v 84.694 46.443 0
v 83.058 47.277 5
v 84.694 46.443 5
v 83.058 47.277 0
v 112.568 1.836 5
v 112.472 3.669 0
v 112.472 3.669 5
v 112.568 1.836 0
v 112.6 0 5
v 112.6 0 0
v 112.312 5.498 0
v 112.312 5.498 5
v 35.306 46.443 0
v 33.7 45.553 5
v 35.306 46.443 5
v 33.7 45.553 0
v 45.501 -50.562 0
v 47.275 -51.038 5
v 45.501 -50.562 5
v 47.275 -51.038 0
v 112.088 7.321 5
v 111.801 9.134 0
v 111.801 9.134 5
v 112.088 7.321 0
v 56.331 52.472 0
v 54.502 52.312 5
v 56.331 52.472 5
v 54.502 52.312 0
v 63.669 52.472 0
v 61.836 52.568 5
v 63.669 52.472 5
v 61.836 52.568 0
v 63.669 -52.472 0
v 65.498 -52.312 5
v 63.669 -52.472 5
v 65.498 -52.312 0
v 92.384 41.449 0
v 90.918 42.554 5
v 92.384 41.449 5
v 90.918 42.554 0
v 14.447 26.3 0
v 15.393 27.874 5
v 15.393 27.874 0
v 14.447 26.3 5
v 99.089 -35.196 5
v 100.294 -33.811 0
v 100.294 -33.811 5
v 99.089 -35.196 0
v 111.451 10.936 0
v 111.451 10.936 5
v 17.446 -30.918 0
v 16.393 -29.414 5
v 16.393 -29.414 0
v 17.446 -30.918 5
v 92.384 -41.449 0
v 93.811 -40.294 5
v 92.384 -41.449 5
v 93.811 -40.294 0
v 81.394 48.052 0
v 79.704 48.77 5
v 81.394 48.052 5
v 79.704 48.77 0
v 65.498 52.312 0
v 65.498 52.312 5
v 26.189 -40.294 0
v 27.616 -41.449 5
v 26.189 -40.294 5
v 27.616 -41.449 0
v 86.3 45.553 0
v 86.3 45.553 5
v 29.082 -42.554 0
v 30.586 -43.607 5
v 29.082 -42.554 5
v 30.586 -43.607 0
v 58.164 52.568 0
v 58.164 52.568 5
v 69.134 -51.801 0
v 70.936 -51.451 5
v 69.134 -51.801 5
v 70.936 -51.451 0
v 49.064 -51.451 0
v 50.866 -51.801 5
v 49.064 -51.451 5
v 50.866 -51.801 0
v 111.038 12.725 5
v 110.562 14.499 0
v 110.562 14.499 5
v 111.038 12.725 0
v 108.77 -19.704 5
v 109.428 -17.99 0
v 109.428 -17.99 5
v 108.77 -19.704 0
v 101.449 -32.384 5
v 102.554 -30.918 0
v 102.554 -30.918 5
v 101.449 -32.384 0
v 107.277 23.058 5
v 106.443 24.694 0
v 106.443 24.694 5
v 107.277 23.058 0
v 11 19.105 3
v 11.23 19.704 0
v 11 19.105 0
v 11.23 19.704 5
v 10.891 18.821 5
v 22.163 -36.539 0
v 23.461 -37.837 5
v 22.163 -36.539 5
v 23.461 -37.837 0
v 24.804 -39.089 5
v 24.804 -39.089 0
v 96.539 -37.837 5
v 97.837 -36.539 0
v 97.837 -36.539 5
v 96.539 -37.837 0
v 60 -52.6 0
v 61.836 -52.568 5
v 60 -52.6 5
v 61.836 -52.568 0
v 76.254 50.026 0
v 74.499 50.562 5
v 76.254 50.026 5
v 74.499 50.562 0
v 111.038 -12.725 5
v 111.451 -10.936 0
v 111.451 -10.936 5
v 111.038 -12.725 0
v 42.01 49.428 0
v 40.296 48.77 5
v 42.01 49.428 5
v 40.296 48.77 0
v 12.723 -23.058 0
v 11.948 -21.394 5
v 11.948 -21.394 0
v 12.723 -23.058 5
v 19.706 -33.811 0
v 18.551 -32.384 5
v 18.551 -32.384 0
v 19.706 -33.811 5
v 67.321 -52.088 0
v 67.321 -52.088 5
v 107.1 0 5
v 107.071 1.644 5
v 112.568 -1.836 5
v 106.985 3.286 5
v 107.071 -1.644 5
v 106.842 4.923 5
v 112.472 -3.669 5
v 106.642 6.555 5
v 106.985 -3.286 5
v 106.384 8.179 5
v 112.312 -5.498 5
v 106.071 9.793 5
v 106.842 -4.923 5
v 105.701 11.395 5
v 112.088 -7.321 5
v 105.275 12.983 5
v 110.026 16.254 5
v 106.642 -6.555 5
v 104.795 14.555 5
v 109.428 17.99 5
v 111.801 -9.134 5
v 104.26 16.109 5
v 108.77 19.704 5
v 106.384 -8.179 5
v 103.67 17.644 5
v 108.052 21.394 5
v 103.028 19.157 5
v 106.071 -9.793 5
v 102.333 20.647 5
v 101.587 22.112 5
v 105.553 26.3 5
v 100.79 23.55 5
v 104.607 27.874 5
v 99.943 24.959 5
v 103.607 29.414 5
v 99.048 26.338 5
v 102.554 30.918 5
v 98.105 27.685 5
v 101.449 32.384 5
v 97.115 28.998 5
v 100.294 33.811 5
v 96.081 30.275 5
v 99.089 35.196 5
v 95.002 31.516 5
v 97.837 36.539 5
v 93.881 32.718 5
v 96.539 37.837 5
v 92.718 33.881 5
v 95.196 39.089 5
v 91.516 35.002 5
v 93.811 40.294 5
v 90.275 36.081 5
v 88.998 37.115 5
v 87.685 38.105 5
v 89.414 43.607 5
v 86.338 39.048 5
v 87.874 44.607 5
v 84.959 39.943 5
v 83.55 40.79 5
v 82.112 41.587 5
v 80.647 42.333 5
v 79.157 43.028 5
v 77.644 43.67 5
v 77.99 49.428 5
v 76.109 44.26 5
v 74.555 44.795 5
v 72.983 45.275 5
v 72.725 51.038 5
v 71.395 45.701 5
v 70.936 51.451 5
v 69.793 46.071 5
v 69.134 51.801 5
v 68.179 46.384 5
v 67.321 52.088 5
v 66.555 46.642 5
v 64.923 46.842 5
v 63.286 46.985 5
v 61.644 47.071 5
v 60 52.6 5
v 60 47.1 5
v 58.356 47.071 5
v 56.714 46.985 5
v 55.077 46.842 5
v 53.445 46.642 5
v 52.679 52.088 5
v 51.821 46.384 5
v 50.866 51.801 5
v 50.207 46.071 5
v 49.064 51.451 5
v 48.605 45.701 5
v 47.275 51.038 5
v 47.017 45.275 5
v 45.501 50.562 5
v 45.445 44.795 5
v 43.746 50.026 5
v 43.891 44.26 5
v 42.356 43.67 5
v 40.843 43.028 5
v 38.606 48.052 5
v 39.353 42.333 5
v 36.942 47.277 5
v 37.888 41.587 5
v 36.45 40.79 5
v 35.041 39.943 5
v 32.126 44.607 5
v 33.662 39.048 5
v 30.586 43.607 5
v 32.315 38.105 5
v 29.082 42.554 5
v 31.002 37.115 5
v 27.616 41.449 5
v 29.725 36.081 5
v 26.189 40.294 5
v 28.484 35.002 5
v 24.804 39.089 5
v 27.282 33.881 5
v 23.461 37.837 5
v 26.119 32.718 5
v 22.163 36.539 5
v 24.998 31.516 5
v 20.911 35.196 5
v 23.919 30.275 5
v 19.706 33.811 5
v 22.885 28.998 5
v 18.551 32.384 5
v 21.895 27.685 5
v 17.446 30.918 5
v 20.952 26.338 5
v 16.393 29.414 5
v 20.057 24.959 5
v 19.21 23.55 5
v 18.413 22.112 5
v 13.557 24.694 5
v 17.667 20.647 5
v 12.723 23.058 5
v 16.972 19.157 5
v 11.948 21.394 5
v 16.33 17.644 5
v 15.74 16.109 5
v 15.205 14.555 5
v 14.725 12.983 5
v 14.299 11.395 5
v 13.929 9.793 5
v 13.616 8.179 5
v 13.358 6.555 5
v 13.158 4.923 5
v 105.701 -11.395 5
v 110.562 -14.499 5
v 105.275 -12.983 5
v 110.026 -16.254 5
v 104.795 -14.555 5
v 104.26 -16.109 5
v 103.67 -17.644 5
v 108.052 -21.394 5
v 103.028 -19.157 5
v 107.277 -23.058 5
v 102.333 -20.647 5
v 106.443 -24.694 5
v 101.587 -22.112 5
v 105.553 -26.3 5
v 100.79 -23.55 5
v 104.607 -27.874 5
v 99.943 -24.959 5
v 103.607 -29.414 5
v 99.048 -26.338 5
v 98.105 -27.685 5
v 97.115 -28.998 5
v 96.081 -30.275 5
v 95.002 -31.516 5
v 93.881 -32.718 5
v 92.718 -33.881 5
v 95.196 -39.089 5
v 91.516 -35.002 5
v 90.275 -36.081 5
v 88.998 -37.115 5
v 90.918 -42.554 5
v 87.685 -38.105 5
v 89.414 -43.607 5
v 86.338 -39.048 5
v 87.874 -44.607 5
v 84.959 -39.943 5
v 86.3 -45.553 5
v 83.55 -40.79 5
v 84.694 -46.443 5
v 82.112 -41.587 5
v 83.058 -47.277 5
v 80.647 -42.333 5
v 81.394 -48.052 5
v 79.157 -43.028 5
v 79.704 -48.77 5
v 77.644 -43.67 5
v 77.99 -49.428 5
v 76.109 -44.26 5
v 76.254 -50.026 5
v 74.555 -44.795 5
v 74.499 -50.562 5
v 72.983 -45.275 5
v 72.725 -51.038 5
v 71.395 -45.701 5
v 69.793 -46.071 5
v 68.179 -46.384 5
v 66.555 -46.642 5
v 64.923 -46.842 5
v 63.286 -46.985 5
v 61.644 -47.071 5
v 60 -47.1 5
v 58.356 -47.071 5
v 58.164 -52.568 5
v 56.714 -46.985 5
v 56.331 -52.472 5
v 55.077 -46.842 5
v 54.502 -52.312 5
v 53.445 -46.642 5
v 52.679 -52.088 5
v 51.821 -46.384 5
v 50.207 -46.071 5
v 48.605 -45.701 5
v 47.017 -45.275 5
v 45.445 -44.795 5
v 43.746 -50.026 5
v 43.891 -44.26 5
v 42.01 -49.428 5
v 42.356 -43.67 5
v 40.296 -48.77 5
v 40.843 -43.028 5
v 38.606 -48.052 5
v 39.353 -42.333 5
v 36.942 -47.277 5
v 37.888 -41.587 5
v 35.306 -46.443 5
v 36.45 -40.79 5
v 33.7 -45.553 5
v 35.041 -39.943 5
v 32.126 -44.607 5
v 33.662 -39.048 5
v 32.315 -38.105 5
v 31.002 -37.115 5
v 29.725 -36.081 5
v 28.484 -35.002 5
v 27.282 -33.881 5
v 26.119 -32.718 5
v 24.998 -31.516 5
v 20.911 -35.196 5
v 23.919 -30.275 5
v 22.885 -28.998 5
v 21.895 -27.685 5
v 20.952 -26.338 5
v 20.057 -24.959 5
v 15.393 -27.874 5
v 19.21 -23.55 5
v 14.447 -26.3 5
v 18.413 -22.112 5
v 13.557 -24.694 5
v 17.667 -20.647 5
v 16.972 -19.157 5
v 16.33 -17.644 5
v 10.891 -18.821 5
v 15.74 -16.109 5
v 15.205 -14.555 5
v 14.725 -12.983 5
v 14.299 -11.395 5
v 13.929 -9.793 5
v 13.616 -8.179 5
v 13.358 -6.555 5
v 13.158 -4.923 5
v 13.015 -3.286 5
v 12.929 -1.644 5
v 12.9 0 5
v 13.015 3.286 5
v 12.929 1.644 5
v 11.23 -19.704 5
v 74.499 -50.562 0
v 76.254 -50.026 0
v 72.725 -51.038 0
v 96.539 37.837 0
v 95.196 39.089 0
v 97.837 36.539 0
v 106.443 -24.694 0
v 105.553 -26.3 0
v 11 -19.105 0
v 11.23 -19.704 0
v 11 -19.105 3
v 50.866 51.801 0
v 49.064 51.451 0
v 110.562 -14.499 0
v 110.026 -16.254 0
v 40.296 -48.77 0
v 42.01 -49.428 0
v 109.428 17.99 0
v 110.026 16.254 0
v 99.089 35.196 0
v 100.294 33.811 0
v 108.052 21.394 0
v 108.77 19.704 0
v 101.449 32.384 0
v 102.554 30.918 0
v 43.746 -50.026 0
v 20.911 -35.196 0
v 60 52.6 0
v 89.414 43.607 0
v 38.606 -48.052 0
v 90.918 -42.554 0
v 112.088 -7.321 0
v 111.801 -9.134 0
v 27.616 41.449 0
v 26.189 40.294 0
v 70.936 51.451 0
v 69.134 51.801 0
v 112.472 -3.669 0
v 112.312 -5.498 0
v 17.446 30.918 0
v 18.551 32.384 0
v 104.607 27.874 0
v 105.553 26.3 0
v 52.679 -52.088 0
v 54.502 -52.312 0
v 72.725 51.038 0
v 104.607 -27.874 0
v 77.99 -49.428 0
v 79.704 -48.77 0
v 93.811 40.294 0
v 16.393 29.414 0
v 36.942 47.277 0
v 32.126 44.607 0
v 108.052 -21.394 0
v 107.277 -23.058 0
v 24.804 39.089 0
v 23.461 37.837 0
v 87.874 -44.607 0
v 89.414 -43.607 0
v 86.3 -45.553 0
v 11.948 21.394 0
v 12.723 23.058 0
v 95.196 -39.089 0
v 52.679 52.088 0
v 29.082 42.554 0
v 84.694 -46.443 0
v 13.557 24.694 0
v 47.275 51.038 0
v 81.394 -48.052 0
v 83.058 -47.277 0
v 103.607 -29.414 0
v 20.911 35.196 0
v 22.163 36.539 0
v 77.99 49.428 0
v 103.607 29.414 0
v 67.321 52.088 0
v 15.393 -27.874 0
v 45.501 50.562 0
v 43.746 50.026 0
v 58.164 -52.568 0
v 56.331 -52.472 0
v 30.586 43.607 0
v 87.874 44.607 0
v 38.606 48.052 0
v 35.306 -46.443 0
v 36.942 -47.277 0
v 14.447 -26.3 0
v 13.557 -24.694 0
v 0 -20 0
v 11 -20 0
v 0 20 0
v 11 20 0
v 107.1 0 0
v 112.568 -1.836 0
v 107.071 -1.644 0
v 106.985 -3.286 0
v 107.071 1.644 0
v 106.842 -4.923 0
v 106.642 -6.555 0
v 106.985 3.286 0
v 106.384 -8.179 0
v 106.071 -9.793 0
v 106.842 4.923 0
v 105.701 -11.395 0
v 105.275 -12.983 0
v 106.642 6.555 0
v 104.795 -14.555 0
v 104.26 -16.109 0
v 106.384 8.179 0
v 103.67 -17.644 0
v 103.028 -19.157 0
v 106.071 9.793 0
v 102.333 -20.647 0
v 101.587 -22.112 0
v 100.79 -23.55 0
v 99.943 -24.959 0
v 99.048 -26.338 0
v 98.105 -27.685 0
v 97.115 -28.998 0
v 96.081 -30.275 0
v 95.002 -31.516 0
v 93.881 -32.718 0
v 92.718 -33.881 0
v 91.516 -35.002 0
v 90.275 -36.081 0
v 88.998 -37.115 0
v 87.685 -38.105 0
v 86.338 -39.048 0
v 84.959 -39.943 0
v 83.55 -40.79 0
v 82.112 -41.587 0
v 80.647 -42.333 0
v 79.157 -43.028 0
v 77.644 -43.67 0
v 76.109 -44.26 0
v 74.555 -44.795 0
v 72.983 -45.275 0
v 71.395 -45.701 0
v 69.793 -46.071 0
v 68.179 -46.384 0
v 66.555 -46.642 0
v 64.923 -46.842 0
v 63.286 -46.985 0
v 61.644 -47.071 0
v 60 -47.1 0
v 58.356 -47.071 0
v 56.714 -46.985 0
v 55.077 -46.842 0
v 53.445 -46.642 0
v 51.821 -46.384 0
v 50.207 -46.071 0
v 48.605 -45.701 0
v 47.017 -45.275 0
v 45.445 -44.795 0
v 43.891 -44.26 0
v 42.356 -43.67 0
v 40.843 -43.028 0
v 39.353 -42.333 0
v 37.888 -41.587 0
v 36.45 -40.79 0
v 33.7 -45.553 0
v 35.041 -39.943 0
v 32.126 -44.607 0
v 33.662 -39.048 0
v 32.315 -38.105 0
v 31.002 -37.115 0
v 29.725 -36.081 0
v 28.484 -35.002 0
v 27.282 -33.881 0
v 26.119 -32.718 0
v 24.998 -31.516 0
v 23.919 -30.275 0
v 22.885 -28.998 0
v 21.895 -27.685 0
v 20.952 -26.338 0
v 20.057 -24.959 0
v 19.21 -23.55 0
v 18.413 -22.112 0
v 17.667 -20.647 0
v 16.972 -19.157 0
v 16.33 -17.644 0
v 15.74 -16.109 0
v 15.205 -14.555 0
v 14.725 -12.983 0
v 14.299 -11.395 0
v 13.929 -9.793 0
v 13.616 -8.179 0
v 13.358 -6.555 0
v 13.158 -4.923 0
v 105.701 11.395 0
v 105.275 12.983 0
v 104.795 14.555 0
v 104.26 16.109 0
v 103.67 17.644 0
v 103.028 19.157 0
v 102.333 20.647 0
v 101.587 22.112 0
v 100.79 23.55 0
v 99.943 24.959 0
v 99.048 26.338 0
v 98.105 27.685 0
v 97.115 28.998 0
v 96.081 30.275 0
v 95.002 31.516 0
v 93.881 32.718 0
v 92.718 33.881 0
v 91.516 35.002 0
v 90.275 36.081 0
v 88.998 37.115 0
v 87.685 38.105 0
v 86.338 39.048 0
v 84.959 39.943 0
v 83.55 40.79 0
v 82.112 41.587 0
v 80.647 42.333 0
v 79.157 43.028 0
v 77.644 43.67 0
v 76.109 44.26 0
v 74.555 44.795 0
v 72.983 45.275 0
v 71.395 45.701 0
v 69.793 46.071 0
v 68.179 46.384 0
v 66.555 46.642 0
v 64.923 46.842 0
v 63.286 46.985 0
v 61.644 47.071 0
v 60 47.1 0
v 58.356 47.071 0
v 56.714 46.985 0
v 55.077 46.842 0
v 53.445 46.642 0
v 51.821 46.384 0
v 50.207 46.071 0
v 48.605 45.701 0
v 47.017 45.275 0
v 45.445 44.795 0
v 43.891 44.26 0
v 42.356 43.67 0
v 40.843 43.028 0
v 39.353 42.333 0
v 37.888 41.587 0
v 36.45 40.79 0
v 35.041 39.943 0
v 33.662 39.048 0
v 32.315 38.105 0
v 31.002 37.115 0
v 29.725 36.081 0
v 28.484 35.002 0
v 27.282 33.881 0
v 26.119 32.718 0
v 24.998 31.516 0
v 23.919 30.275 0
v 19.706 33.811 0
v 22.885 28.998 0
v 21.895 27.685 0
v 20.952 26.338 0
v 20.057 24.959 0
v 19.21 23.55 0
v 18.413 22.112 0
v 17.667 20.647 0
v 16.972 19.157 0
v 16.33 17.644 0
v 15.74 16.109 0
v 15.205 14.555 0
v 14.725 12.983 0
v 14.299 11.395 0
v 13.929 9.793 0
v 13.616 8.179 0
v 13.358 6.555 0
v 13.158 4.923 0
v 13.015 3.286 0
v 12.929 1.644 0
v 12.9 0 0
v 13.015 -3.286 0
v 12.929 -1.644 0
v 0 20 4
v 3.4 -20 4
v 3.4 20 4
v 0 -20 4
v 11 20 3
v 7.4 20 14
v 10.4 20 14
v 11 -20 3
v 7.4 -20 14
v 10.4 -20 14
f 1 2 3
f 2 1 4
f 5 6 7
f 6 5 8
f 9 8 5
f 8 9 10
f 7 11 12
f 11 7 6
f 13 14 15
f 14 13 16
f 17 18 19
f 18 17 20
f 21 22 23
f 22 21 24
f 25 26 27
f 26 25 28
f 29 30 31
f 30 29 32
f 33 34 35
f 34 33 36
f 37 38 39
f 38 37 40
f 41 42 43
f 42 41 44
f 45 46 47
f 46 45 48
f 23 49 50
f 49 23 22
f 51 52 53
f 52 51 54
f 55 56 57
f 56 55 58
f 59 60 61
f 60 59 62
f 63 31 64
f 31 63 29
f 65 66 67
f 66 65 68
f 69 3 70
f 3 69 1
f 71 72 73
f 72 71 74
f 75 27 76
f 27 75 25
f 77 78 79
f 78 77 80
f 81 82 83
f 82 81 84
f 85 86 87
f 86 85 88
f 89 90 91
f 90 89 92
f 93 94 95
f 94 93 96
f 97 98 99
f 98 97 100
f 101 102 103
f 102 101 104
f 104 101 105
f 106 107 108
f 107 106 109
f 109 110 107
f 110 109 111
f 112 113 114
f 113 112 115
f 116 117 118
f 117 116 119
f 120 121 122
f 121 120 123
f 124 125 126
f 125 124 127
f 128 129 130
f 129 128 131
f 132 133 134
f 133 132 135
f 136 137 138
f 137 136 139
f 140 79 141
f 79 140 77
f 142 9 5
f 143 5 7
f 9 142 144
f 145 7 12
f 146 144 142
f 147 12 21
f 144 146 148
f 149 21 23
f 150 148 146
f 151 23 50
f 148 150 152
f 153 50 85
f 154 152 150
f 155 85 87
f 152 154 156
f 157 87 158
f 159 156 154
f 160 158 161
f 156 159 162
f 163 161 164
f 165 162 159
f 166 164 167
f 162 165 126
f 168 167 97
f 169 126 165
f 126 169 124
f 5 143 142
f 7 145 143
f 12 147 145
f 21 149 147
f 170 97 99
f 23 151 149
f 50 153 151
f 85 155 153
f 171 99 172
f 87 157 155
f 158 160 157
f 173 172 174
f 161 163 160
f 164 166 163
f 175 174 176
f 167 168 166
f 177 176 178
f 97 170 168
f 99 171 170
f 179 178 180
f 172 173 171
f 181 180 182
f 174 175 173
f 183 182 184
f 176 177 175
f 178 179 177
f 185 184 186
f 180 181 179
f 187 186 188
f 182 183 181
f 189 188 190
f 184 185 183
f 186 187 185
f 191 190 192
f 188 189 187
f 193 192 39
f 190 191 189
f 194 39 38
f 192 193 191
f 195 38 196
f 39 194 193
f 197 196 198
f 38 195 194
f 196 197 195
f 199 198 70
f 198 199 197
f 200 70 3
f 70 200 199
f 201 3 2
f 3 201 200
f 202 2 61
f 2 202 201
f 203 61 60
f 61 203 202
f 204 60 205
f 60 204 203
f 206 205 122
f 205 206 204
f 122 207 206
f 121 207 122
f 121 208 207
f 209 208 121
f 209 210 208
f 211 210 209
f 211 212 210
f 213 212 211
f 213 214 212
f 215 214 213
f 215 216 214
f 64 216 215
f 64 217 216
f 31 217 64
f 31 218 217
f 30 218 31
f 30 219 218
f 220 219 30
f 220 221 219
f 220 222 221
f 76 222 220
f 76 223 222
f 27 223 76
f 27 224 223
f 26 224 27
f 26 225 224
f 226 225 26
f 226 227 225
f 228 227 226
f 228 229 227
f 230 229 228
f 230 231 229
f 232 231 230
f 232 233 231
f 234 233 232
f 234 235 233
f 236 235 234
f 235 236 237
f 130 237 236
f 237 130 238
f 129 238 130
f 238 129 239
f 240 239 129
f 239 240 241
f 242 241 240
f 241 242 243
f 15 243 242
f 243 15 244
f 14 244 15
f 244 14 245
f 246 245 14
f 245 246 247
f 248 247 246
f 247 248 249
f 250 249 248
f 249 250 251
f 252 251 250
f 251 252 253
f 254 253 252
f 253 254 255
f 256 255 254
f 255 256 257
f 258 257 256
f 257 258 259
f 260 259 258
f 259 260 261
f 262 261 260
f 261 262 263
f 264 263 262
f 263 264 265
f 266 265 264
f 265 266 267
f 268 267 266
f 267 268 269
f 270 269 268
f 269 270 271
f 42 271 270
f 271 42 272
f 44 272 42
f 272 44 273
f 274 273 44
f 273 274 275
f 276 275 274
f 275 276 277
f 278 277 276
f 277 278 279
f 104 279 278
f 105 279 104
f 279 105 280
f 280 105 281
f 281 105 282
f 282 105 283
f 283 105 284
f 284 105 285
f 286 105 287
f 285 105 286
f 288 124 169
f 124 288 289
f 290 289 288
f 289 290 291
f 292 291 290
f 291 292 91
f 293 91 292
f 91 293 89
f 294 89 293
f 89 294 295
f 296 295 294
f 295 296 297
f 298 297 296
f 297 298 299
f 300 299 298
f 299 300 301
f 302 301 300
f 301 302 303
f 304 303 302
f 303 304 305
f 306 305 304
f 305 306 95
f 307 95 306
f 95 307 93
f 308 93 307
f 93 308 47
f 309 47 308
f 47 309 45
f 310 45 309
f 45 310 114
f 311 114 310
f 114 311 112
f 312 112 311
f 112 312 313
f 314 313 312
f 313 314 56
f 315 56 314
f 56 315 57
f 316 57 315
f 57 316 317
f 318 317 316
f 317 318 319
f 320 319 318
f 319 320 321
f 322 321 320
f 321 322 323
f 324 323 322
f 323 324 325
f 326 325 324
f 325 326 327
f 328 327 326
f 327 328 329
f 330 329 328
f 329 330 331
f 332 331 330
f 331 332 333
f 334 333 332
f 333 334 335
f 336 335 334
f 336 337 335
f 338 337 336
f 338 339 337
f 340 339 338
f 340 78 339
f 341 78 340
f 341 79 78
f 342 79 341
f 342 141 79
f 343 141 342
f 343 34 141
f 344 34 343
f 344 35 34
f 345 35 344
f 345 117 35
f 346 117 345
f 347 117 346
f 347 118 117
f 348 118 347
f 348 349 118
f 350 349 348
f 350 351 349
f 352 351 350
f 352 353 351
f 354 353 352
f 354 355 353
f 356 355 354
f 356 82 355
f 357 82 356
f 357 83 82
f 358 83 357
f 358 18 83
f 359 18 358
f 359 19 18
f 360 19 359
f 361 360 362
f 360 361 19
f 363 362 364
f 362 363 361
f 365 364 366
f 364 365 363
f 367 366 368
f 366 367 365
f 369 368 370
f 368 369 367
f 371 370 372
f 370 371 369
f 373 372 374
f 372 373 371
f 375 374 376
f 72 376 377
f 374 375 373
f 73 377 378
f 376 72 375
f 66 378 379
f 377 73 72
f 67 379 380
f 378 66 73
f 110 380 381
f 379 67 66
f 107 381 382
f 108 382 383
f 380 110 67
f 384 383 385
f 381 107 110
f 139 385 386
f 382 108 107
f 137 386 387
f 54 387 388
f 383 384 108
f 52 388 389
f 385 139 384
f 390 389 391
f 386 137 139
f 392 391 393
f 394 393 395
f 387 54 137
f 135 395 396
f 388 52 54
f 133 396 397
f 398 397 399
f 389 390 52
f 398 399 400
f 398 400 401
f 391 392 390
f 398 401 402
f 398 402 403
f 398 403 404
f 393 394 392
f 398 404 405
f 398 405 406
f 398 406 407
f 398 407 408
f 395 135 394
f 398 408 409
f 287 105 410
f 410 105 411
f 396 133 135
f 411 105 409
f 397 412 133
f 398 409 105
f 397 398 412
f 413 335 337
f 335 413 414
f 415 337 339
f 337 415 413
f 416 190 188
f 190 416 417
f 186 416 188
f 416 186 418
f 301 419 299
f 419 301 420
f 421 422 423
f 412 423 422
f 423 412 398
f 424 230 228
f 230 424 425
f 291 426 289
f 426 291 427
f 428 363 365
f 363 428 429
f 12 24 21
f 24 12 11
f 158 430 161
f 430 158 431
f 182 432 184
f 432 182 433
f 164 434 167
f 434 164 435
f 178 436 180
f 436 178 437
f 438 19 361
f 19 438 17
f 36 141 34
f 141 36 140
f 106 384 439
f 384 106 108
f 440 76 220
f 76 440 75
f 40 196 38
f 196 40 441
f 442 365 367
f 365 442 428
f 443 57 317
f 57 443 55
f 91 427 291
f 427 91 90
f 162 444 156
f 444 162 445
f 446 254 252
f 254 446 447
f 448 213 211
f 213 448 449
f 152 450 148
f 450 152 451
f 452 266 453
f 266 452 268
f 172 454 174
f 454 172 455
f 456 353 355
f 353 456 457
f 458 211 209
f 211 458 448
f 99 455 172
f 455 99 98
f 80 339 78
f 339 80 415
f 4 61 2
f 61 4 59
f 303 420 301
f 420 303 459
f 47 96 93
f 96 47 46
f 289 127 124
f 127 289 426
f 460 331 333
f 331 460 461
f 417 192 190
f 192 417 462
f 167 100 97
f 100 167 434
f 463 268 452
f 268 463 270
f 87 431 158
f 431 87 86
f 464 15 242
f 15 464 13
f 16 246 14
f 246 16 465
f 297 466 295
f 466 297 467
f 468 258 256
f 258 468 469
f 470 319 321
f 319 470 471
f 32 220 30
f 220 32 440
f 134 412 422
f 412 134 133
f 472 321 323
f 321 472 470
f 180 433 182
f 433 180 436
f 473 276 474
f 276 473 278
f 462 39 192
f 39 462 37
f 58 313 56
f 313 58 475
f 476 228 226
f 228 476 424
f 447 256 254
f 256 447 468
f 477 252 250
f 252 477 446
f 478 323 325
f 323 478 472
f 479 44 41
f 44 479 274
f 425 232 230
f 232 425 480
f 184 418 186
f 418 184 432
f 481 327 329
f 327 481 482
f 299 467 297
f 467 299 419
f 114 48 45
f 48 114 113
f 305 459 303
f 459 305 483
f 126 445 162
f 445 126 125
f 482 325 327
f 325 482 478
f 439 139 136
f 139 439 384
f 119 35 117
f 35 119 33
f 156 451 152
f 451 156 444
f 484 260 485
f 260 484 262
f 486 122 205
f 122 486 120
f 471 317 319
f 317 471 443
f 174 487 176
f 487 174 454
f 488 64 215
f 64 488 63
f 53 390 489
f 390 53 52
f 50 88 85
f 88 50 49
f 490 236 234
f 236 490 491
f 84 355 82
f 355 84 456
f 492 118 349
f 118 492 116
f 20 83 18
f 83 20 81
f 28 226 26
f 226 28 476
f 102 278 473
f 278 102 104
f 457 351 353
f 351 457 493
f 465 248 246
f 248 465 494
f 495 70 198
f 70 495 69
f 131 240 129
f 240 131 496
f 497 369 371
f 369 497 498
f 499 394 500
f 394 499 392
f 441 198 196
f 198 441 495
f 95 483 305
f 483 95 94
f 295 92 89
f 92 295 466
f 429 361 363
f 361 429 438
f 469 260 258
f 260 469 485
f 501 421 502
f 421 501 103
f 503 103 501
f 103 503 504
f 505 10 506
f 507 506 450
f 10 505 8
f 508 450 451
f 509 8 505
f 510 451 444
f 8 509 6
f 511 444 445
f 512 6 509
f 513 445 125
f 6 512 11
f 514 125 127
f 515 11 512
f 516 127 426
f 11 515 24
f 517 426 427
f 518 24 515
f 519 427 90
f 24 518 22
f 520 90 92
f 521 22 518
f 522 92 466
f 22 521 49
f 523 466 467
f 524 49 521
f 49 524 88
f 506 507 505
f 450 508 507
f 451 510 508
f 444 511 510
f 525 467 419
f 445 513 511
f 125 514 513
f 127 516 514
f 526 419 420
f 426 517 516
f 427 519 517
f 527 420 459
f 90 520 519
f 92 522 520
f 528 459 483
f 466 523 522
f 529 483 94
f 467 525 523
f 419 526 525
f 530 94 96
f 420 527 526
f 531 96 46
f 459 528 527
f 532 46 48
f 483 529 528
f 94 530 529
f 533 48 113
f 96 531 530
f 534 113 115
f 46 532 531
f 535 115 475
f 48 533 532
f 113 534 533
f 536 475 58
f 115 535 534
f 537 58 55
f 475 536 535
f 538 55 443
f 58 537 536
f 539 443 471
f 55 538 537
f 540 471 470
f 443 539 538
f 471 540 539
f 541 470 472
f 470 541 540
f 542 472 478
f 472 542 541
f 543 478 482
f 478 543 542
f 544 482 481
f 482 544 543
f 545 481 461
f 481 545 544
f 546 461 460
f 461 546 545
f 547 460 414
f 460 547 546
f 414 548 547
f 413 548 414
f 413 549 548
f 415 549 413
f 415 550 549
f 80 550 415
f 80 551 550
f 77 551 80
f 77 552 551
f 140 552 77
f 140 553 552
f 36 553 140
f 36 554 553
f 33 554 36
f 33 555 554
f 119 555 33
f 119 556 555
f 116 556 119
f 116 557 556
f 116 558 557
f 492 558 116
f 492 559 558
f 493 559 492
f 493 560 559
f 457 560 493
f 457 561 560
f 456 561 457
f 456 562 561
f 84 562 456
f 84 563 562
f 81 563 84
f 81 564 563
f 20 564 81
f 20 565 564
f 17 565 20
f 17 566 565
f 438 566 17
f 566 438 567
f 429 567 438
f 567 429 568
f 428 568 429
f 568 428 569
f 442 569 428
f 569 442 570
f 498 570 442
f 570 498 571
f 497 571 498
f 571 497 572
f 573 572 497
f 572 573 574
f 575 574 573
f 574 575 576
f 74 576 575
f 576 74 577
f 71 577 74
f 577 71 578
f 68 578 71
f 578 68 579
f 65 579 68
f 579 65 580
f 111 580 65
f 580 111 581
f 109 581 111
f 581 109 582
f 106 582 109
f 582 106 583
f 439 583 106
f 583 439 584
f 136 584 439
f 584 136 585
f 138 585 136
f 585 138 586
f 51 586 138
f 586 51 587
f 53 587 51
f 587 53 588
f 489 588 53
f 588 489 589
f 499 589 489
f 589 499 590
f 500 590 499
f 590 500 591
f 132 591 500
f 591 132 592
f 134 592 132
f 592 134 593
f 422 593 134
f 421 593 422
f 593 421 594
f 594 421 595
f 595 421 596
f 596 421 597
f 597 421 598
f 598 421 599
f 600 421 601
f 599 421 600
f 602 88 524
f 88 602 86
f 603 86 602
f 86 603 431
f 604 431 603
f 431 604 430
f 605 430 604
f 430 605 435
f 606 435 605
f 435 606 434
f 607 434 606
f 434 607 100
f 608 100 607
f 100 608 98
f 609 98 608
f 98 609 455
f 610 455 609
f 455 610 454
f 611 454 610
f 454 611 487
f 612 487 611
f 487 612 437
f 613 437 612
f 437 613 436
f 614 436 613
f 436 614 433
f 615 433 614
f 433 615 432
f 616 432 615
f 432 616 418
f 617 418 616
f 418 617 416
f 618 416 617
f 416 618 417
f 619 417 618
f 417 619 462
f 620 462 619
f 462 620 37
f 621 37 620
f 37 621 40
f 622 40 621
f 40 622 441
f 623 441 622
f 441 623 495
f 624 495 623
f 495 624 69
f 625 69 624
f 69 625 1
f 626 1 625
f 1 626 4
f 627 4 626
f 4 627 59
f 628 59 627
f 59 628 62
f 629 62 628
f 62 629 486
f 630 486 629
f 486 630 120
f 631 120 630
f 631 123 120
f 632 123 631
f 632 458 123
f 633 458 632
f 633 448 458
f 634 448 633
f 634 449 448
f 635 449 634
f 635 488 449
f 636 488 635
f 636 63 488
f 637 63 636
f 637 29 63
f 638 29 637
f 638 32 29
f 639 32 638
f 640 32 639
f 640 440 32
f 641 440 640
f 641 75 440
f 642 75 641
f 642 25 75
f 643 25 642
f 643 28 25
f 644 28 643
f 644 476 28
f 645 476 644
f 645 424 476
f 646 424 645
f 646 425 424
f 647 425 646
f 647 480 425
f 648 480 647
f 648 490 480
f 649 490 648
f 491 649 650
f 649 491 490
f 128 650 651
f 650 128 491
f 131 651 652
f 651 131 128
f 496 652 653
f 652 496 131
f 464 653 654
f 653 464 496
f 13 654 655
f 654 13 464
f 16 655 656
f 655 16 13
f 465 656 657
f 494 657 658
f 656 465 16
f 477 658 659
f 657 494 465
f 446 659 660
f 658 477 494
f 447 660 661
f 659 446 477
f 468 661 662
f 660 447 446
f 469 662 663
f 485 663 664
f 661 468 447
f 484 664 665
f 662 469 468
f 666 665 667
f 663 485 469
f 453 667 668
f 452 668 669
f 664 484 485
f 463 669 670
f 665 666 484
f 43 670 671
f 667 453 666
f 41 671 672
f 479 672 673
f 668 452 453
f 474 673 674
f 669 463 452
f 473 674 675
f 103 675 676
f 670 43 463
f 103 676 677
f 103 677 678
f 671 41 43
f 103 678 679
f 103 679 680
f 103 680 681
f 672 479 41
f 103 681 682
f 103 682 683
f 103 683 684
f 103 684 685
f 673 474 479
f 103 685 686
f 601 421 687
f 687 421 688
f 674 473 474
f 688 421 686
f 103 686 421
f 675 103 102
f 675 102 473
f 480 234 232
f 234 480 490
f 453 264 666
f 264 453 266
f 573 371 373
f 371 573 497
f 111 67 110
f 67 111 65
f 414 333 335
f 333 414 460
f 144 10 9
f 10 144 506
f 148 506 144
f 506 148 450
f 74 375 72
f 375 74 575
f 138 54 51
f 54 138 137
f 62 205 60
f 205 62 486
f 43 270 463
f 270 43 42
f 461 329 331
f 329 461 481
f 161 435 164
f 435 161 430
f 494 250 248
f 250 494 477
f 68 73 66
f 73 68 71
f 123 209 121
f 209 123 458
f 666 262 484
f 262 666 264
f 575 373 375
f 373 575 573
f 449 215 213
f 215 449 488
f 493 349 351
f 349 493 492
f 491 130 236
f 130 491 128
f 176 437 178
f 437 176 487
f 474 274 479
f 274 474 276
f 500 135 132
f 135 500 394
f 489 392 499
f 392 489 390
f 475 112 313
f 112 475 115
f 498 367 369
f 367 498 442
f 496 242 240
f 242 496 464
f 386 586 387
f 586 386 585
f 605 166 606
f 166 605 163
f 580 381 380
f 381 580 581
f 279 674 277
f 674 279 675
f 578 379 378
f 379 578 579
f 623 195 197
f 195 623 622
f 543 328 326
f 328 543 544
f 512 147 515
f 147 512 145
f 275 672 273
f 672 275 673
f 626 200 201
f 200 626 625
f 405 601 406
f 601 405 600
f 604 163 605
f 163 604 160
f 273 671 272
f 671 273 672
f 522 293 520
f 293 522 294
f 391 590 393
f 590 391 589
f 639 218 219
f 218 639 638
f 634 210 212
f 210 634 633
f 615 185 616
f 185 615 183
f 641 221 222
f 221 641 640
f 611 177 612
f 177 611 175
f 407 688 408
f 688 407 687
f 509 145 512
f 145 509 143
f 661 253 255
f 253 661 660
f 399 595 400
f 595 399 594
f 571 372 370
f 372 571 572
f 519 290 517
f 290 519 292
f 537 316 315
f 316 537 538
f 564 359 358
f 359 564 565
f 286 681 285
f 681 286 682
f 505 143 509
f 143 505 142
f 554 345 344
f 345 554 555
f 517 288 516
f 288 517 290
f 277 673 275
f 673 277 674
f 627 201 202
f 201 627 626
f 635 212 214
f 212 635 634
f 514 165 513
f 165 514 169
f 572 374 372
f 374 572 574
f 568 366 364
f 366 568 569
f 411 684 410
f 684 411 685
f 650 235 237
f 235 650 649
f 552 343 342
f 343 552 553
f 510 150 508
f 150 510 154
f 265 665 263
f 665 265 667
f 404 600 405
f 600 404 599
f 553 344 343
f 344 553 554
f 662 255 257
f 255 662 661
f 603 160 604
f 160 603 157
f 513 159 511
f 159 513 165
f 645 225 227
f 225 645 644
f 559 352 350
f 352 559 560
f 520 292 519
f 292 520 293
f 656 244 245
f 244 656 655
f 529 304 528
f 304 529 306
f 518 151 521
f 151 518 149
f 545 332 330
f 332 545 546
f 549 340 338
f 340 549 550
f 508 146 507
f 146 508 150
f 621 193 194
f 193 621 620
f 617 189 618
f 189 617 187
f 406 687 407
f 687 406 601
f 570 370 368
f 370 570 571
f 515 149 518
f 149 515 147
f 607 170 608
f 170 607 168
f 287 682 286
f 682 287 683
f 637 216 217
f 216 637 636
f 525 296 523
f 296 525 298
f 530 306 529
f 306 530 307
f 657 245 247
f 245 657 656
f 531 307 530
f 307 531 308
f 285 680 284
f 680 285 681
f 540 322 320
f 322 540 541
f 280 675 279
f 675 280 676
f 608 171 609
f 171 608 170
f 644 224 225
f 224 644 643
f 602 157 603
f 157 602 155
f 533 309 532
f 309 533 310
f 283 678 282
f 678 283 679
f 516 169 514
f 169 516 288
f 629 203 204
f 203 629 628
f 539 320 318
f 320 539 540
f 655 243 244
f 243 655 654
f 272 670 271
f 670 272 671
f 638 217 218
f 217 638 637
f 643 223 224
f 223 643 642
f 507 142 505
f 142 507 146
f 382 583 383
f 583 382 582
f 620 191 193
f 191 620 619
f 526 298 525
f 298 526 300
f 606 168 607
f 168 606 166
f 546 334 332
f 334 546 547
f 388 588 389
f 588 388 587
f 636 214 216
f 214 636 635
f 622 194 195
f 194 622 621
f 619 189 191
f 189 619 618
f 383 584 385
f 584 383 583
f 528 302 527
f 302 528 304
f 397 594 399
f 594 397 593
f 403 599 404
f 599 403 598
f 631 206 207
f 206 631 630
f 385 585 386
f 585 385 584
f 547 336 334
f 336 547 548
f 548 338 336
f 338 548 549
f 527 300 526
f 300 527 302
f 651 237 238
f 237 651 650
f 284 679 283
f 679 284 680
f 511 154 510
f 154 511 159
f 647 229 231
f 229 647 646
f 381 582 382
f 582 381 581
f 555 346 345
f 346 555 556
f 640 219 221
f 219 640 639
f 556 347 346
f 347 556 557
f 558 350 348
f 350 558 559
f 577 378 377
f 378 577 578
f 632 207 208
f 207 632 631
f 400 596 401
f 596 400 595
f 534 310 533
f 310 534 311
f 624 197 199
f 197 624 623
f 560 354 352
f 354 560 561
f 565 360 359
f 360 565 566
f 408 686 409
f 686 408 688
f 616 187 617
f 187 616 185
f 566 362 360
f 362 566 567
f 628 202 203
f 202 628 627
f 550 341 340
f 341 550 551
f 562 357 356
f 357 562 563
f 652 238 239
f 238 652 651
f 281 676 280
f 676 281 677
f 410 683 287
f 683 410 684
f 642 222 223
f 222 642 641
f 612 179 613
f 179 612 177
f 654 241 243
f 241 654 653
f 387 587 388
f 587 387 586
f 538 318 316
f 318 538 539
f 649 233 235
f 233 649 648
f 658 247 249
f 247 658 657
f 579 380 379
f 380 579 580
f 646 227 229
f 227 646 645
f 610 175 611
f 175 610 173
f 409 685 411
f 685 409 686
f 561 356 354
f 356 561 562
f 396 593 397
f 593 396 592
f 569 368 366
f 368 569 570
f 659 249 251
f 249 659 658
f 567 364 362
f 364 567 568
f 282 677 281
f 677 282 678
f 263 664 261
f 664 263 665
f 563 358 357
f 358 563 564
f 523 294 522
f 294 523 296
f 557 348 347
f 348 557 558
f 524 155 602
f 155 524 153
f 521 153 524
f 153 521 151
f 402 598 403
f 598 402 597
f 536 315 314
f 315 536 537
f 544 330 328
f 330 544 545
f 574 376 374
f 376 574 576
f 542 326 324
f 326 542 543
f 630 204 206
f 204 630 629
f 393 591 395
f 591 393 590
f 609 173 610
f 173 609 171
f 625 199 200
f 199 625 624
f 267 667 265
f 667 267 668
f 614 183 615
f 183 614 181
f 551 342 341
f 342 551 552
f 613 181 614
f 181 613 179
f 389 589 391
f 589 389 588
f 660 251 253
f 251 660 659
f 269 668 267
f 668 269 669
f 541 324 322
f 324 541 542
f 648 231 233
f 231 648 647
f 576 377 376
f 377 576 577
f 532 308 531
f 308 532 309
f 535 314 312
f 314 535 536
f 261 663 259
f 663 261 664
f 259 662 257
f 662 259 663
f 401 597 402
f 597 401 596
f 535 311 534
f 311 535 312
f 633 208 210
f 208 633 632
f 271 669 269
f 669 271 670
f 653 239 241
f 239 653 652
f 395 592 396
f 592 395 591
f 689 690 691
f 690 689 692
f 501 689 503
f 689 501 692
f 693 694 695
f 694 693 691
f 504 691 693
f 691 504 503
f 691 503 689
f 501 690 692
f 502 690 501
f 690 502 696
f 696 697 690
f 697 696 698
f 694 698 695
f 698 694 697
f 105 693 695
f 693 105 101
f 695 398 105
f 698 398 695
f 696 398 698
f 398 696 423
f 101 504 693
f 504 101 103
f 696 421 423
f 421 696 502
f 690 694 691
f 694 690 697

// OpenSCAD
// file: ../../../core_mount_system/c_clamp/v1/c_clamp_profile_topref_v1.scad
// Trimmed C-clamp profile points (top-referenced)
// Anchor (top-left of profile): [-44.036300, 71.921100] in original SVG coords
min_profile_x = -14.040700;
max_profile_x = 13.036300;
min_profile_y = -58.433800;
max_profile_y = 0.000000;
hook_center_x = 0.394322;
hook_center_r = 9.774756;

profile_points = [
    [-1.354700, -58.375500],
    [-1.262400, -58.366400],
    [-1.075100, -58.335500],
    [-0.890300, -58.292400],
    [-0.708700, -58.237300],
    [-0.531100, -58.170500],
    [-0.479900, -58.147300],
    [0.435500, -57.878300],
    [2.227800, -57.291000],
    [3.948600, -56.519300],
    [5.579300, -55.571700],
    [7.101700, -54.458600],
    [8.499200, -53.192100],
    [9.756500, -51.786300],
    [10.859600, -50.256700],
    [11.796500, -48.619800],
    [12.556900, -46.893900],
    [13.036300, -45.397700],
    [13.036300, 0.000000],
    [0.000000, 0.000000],
    [-2.487100, -0.581400],
    [-3.966900, -0.962300],
    [-5.399200, -1.494600],
    [-6.768500, -2.172500],
    [-8.060200, -2.988900],
    [-9.260200, -3.934800],
    [-10.355700, -5.000000],
    [-11.334700, -6.173200],
    [-12.186800, -7.441500],
    [-12.902800, -8.791400],
    [-13.474900, -10.208200],
    [-13.897000, -11.676800],
    [-14.031000, -12.906400],
    [-14.040700, -14.143300],
    [-13.926000, -15.374900],
    [-13.687900, -16.588800],
    [-13.329100, -17.772500],
    [-12.853000, -18.914100],
    [-12.264500, -20.002100],
    [-12.257100, -20.143100],
    [-12.235000, -20.282600],
    [-12.198400, -20.419000],
    [-12.147800, -20.550800],
    [-12.083700, -20.676600],
    [-12.006800, -20.795100],
    [-11.918000, -20.904800],
    [-11.818100, -21.004700],
    [-11.708400, -21.093500],
    [-11.589900, -21.170400],
    [-11.464100, -21.234500],
    [-11.332300, -21.285200],
    [-11.195900, -21.321700],
    [-11.056400, -21.343800],
    [-10.915400, -21.351200],
    [-10.438500, -21.351200],
    [-10.297500, -21.343800],
    [-10.158100, -21.321700],
    [-10.021700, -21.285100],
    [-9.889800, -21.234500],
    [-9.764000, -21.170400],
    [-9.645600, -21.093500],
    [-9.535800, -21.004700],
    [-9.436000, -20.904800],
    [-9.347100, -20.795100],
    [-9.270200, -20.676600],
    [-9.206100, -20.550800],
    [-9.155500, -20.419000],
    [-9.119000, -20.282600],
    [-9.096900, -20.143100],
    [-9.089500, -20.002100],
    [-9.089500, -15.001200],
    [-9.033600, -13.971300],
    [-8.866800, -12.953600],
    [-8.590900, -11.959800],
    [-8.209100, -11.001700],
    [-7.726000, -10.090500],
    [-7.147300, -9.236900],
    [-6.479600, -8.450900],
    [-5.730800, -7.741600],
    [-4.909800, -7.117400],
    [-4.026100, -6.585700],
    [-3.090000, -6.152700],
    [-2.112700, -5.823400],
    [-1.105400, -5.601700],
    [-0.080100, -5.490100],
    [0.951200, -5.490100],
    [1.976500, -5.601700],
    [2.983700, -5.823400],
    [3.961100, -6.152700],
    [4.897100, -6.585700],
    [5.780800, -7.117400],
    [6.601900, -7.741600],
    [7.350600, -8.450900],
    [8.018300, -9.236900],
    [8.597100, -10.090500],
    [9.080200, -11.001700],
    [9.461900, -11.959800],
    [9.737800, -12.953600],
    [9.904700, -13.971300],
    [9.960500, -15.001200],
    [9.960500, -38.196700],
    [9.659000, -39.971400],
    [9.174700, -41.705100],
    [8.512800, -43.379200],
    [7.680500, -44.975400],
    [6.686900, -46.476400],
    [5.542600, -47.866000],
    [4.260100, -49.129200],
    [2.853300, -50.252300],
    [1.337300, -51.223100],
    [-0.271300, -52.031100],
    [-1.640900, -52.548600],
    [-1.640900, -52.591200],
    [-1.830600, -52.597400],
    [-2.019400, -52.616000],
    [-2.206700, -52.646900],
    [-2.391500, -52.690100],
    [-2.573100, -52.745100],
    [-2.750700, -52.812000],
    [-2.923500, -52.890300],
    [-3.090900, -52.979800],
    [-3.252000, -53.080000],
    [-3.406300, -53.190500],
    [-3.553000, -53.310900],
    [-3.691500, -53.440600],
    [-3.821200, -53.579100],
    [-3.941600, -53.725800],
    [-4.052200, -53.880100],
    [-4.152400, -54.041200],
    [-4.241800, -54.208600],
    [-4.320100, -54.381400],
    [-4.387000, -54.559100],
    [-4.442100, -54.740600],
    [-4.485200, -54.925500],
    [-4.516100, -55.112700],
    [-4.534700, -55.301600],
    [-4.540900, -55.491200],
    [-4.534700, -55.680900],
    [-4.516100, -55.869800],
    [-4.485200, -56.057000],
    [-4.442100, -56.241800],
    [-4.387000, -56.423400],
    [-4.320100, -56.601000],
    [-4.241800, -56.773900],
    [-4.152400, -56.941200],
    [-4.052200, -57.102400],
    [-3.941600, -57.256600],
    [-3.821200, -57.403300],
    [-3.691500, -57.541800],
    [-3.553000, -57.671600],
    [-3.406300, -57.791900],
    [-3.252000, -57.902500],
    [-3.090900, -58.002700],
    [-2.923500, -58.092200],
    [-2.750700, -58.170500],
    [-2.573100, -58.237300],
    [-2.391500, -58.292400],
    [-2.206700, -58.335500],
    [-2.019400, -58.366400],
    [-1.830600, -58.385000],
    [-1.640900, -58.391200],
    [-1.640900, -58.433800],
];
// main file
// costco_cup_holder (v1)
// Lip-capture hoop for a Solo-style cup using the canonical C-clamp mount.

$fn = 180;
include <../../../core_mount_system/c_clamp/v1/c_clamp_profile_topref_v1.scad>;

// -------------------------------
// Quick Tuning (Common)
// -------------------------------
render_holder_only = true; // true = quick sample print of holder only

show_clamp = true;
show_pad = true;
show_holder = true;

sweep_angle = 24;                // deg, manual fallback
sweep_fit_mode = "auto_hoop_kiss"; // "manual" or "auto_hoop_kiss"
sweep_fit_diameter_mode = "hoop_outer"; // "hoop_outer" or "cup_lip_exterior"
sweep_kiss_clearance = 0.0;      // extra radial margin for sweep-fit calc

radius = 222.25;                 // mm
radius_ref_mode = "hook_center"; // "hook_center" or "outer_edge"
axis_z = 0;

pad_length = 13.5;
pad_thickness = 5;
pad_overlap = 1.0;
pad_offset_y = 0;                // keep 0 to preserve top-reference behavior

// Cup / hoop fit
cup_lip_diameter = 97.0;          // measured OD at rolled lip
cup_body_diameter_below_lip = 93.5; // OD just below lip where cup passes through
ring_thickness = 5.5;             // radial hoop wall thickness
clearance = 0.35;                 // added to body pass-through diameter
ring_height = 5; // use 14 for final, 5 just to check;                 // vertical hoop height for lip support

// Holder placement
attach_angle = sweep_angle / 2;   // used when attach_angle_mode = "manual"
attach_angle_mode = "auto_center"; // "auto_center" or "manual"
holder_radial_location_on_pad = pad_length * 0.05;
holder_top_offset = 0;
holder_tilt_deg = 5;

// Bridge and strength
hoop_center_offset_from_mount = 60; // targets ~10 mm gap from pad outer edge to ring start
bridge_width = 40;
bridge_thickness = 4;
bridge_overlap_into_ring = 1;

enable_mount_gusset = true;
mount_gusset_width = 2300;
mount_gusset_mount_inset = 3;
mount_gusset_ring_inset = 0;
mount_gusset_base_depth = 8;
mount_gusset_base_height = 3;
mount_gusset_top_depth = 3;
mount_gusset_top_height = 10;

// -------------------------------
// Advanced Controls
// -------------------------------
show_profile = false;
show_axis = true;
axis_marker_r = 1.5;

show_attach_marker = false;
attach_marker_r = 1.0;

// -------------------------------
// Derived
// -------------------------------
radius_ref_x = (radius_ref_mode == "hook_center") ? hook_center_x : max_profile_x;
axis_x = radius_ref_x - radius;
axis_shift_x = max(0, axis_x - min_profile_x + 0.1);

attach_x = max_profile_x + holder_radial_location_on_pad;
attach_profile_y_2d = max_profile_y + holder_top_offset;
attach_profile_y_sweep = attach_profile_y_2d - axis_z;
attach_r = axis_shift_x + (attach_x - axis_x);

hoop_inner_diameter = cup_body_diameter_below_lip + (2 * clearance);
hoop_outer_diameter = hoop_inner_diameter + (2 * ring_thickness);
hoop_outer_radius = hoop_outer_diameter / 2;
lip_seat_radial_margin = (cup_lip_diameter - hoop_inner_diameter) / 2;

hoop_center_radial_for_sweep = attach_r + (hoop_center_offset_from_mount * cos(holder_tilt_deg));
sweep_fit_radius = (((sweep_fit_diameter_mode == "cup_lip_exterior") ? cup_lip_diameter : hoop_outer_diameter) / 2) + sweep_kiss_clearance;
sweep_half_angle_auto = (hoop_center_radial_for_sweep > 0) ? asin(min(1, sweep_fit_radius / hoop_center_radial_for_sweep)) : 90;
sweep_angle_auto = 2 * sweep_half_angle_auto;
sweep_angle_effective = (sweep_fit_mode == "auto_hoop_kiss") ? sweep_angle_auto : sweep_angle;
attach_angle_effective = (attach_angle_mode == "auto_center") ? (sweep_angle_effective / 2) : attach_angle;

bridge_length = max(0.1, hoop_center_offset_from_mount - hoop_outer_radius + bridge_overlap_into_ring);

// "Under-hoop open" check: hole should begin beyond pad outer edge.
pad_outer_x_from_mount = pad_length - holder_radial_location_on_pad;
hole_min_x_from_mount = hoop_center_offset_from_mount - (hoop_inner_diameter / 2);
under_hoop_open_margin = 2.0;

if (holder_radial_location_on_pad < 0 || holder_radial_location_on_pad > pad_length)
    echo("WARNING: holder_radial_location_on_pad is outside pad_length.");

if (lip_seat_radial_margin <= 0)
    echo("WARNING: cup lip will not seat. Increase cup_lip_diameter or reduce hole diameter.");

if (ring_thickness < 3)
    echo("WARNING: ring_thickness < 3 mm may be weak for loaded cup.");

if (bridge_length <= 0.5)
    echo("WARNING: hoop center is too close to mount; bridge has near-zero length.");

if (hole_min_x_from_mount <= pad_outer_x_from_mount + under_hoop_open_margin)
    echo("WARNING: hole overlaps pad under the hoop. Increase hoop_center_offset_from_mount and/or holder_radial_location_on_pad.");

if (sweep_fit_mode == "auto_hoop_kiss" && hoop_center_radial_for_sweep <= sweep_fit_radius)
    echo("WARNING: auto sweep-fit invalid; sweep-fit radius exceeds hoop center radius.");

// -------------------------------
// Clamp / Pad Geometry (swept)
// -------------------------------
module clamp_profile() {
    polygon(points = profile_points);
}

module pad_profile() {
    x0 = max_profile_x - pad_overlap;
    y0 = max_profile_y - pad_thickness + pad_offset_y;
    translate([x0, y0])
        square([pad_length + pad_overlap, pad_thickness], center = false);
}

module clamp_pad_profile() {
    union() {
        if (show_clamp) clamp_profile();
        if (show_pad) pad_profile();
    }
}

module clamp_pad_sweep() {
    rotate([90, 0, 0])
        rotate_extrude(angle = sweep_angle_effective)
            translate([axis_shift_x, 0])
                translate([-axis_x, -axis_z])
                    clamp_pad_profile();
}

// local +X = radial outward, +Y = tangent, +Z = profile-up
module attachment_frame(angle_deg, radial_r, profile_y, tangent = 0) {
    rotate([90, 0, 0])
        rotate([0, 0, angle_deg])
            translate([radial_r, tangent, profile_y])
                children();
}

// -------------------------------
// Holder Geometry (linear, non-swept)
// -------------------------------
module holder_hoop_linear() {
    difference() {
        cylinder(h = ring_height, d = hoop_outer_diameter, center = false);
        translate([0, 0, -0.1])
            cylinder(h = ring_height + 0.2, d = hoop_inner_diameter, center = false);
    }
}

module holder_bridge_linear() {
    translate([0, -bridge_width / 2, 0])
        cube([bridge_length, bridge_width, bridge_thickness], center = false);
}

module holder_mount_gusset_linear() {
    if (enable_mount_gusset) {
        gusset_width_eff = min(mount_gusset_width, bridge_width);
        x_base = max(0, mount_gusset_mount_inset);
        x_top = max(x_base + 0.1, hoop_center_offset_from_mount - hoop_outer_radius + mount_gusset_ring_inset);
        y0 = -gusset_width_eff / 2;
        z_top = max(bridge_thickness, ring_height - mount_gusset_top_height);

        hull() {
            translate([x_base, y0, 0])
                cube([mount_gusset_base_depth, gusset_width_eff, mount_gusset_base_height], center = false);
            translate([x_top, y0, z_top])
                cube([mount_gusset_top_depth, gusset_width_eff, mount_gusset_top_height], center = false);
        }
    }
}

module holder_linear() {
    union() {
        holder_bridge_linear();
        holder_mount_gusset_linear();
        translate([hoop_center_offset_from_mount, 0, 0])
            holder_hoop_linear();
    }
}

module holder_positioned() {
    attachment_frame(attach_angle_effective, attach_r, attach_profile_y_sweep, 0)
        rotate([0, holder_tilt_deg, 0])
            holder_linear();
}

module holder_only_sample() {
    holder_linear();
}

// -------------------------------
// Output
// -------------------------------
if (show_profile) {
    translate([axis_shift_x, 0])
        translate([-axis_x, -axis_z])
            clamp_pad_profile();

    if (show_attach_marker) {
        color("orange")
            translate([axis_shift_x, 0])
                translate([-axis_x, -axis_z])
                    translate([attach_x, attach_profile_y_2d])
                        circle(r = attach_marker_r, $fn = 36);
    }

    if (show_axis) {
        color("red")
            translate([axis_shift_x, 0])
                circle(r = axis_marker_r, $fn = 48);
    }
} else {
    if (render_holder_only) {
        if (show_holder) holder_only_sample();
    } else {
        union() {
            clamp_pad_sweep();
            if (show_holder) holder_positioned();
        }
    }
}
